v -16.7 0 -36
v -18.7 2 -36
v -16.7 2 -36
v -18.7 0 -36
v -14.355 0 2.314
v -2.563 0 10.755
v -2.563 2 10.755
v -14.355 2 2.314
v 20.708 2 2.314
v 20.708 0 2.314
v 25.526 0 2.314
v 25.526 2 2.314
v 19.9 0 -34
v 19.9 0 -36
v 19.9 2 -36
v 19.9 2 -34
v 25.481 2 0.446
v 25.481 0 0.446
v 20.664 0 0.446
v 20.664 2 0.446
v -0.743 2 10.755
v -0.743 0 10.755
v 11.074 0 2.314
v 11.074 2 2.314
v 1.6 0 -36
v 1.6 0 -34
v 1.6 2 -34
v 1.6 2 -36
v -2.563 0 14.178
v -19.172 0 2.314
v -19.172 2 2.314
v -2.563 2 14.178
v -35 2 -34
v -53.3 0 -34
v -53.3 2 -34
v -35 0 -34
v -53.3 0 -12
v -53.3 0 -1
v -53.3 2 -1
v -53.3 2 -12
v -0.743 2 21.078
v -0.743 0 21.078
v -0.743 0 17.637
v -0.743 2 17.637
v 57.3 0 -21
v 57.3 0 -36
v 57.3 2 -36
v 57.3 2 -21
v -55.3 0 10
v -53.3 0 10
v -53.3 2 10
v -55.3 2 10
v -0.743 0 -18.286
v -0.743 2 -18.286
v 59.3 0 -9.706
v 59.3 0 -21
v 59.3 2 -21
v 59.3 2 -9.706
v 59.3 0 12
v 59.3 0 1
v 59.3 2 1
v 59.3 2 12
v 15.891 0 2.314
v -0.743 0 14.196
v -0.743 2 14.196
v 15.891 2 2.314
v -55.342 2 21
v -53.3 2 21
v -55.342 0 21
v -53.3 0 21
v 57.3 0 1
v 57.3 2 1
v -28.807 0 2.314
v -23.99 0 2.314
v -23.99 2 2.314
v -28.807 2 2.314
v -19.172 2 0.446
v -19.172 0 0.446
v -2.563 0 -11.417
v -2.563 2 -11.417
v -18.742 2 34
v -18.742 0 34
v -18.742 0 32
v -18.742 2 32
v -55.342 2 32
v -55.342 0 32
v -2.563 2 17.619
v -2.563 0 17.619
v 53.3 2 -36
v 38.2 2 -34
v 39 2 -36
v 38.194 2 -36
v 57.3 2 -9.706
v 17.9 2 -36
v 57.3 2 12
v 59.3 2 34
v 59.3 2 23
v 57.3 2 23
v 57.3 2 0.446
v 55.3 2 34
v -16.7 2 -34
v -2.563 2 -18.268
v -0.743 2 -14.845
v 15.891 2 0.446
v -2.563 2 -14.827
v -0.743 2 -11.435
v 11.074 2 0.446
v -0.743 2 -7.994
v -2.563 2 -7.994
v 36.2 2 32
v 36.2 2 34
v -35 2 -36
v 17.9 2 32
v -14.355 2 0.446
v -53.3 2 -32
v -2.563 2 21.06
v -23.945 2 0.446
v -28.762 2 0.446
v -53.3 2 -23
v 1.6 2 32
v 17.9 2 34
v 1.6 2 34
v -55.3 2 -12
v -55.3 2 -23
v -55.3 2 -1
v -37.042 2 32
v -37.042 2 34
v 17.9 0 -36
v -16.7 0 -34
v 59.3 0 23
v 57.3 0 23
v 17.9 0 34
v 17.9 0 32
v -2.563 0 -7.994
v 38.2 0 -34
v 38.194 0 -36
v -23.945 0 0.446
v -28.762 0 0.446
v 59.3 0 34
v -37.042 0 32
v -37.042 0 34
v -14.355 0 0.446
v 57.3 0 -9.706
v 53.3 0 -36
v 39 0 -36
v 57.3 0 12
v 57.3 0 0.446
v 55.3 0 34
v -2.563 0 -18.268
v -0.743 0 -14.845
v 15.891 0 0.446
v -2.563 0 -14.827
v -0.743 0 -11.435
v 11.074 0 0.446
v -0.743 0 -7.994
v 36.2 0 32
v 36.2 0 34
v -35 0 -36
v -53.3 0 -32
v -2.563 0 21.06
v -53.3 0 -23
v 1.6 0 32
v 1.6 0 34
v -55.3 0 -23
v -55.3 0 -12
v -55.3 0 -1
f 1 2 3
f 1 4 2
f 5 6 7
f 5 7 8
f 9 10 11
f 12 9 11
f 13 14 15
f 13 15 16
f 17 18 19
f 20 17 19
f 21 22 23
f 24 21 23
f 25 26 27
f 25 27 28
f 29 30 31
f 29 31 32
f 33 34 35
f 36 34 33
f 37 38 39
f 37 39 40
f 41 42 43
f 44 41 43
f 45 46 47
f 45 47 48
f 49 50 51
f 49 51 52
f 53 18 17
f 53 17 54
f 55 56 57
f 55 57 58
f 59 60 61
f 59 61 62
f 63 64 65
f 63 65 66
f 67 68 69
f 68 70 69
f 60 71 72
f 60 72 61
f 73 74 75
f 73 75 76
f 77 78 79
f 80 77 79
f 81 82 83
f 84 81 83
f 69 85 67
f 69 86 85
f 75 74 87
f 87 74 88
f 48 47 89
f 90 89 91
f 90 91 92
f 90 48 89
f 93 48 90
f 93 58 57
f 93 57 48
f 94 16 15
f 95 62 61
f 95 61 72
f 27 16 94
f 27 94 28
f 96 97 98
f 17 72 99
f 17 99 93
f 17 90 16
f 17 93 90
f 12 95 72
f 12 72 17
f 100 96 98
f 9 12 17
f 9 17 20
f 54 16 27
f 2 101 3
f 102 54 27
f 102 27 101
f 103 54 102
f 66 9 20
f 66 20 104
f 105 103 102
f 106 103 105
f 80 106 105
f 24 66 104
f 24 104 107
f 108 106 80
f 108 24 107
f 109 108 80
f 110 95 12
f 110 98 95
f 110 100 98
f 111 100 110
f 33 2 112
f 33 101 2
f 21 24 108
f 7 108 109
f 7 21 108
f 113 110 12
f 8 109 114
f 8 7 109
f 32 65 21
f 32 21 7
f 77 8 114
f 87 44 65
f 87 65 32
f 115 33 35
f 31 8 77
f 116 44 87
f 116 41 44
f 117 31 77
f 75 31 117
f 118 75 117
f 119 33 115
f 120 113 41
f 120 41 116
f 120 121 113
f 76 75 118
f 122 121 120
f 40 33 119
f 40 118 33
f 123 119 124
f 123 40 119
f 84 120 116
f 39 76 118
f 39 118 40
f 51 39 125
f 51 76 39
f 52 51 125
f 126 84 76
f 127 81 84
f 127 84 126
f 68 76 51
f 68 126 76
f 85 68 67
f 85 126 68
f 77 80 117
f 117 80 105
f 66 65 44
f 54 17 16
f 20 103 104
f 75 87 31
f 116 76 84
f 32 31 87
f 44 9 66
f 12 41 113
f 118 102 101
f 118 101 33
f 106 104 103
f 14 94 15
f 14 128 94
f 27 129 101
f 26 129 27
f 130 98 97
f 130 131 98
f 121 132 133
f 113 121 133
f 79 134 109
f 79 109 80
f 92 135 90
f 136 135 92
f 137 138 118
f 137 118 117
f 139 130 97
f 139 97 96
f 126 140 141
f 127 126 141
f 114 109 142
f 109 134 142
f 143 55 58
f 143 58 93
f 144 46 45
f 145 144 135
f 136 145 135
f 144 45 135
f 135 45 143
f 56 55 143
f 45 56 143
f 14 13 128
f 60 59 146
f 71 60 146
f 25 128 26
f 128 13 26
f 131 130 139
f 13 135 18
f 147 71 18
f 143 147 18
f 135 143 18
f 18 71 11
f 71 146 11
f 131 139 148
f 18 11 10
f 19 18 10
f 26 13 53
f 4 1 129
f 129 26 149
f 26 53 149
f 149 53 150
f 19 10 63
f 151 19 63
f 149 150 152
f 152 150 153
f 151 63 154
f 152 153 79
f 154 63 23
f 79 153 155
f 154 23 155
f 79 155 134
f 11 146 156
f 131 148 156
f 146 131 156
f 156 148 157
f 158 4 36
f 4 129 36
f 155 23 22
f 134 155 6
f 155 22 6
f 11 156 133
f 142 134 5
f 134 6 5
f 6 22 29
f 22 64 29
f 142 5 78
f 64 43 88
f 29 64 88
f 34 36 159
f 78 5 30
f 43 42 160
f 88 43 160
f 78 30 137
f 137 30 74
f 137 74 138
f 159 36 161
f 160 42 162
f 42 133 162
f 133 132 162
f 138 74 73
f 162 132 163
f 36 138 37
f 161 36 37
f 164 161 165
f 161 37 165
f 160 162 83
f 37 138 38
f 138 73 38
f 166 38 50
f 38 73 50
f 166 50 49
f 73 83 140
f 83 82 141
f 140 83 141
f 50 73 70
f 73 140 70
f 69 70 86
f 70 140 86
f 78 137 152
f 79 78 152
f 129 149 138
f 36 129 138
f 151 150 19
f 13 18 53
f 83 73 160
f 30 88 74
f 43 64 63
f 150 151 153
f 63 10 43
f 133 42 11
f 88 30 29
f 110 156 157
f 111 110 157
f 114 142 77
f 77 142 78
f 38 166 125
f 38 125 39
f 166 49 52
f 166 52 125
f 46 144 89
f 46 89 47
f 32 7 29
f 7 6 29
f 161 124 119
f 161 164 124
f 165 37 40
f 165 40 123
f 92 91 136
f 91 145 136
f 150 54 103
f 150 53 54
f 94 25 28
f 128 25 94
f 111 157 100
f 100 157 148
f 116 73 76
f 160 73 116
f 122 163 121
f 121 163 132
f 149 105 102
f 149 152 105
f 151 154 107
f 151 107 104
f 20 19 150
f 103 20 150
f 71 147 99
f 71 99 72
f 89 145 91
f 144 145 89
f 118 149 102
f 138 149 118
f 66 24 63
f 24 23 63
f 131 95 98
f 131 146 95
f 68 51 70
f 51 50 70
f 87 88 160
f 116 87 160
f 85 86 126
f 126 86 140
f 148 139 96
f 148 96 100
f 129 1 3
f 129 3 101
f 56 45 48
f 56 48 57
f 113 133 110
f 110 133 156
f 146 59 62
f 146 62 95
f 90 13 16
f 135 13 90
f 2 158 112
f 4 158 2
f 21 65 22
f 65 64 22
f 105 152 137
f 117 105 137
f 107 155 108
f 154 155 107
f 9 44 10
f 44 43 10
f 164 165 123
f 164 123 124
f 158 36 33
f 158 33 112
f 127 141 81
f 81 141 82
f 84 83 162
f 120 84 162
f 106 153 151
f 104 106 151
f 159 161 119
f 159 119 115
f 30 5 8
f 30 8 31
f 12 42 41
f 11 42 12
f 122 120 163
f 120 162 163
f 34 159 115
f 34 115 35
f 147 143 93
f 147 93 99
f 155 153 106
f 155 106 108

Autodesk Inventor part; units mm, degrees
ref_plane "YZ Plane" through (0, 0, 0) normal (1, 0, 0) x (0, 1, 0)
ref_plane "XZ Plane" through (0, 0, 0) normal (0, 1, 0) x (-1, 0, 0)
ref_plane "XY Plane" through (0, 0, 0) normal (0, 0, 1) x (1, 0, 0)
sketch "Sketch1" plane through (0, 0, 0) normal (0, 1, 0) x (-1, 0, 0)
  line L0 (-55.3, 34) -> (55.3, -34) construction
  line L1 (55.3424, 32) -> (55.3424, 21)
  line L2 (53.3, 10) -> (55.3, 10)
  line L3 (55.3, 10) -> (55.3, -1)
  line L4 (55.3, -1) -> (53.3, -1)
  line L5 (53.3, -1) -> (53.3, -12)
  line L6 (53.3, -12) -> (55.3, -12)
  line L7 (55.3, -12) -> (55.3, -23)
  line L8 (55.3, -23) -> (53.3, -23)
  line L9 (55.3424, 21) -> (55.3424, 32)
  line L10 (55.3, -23) -> (55.3, -12)
  line L11 (55.3, -1) -> (55.3, 10)
  line L12 (-53.3, 0.4465) -> (-53.3, 0.446)
  line L13 (-53.3487, -21) -> (-53.3, -21)
  line L14 (55.3424, 32) -> (37.0424, 32)
  line L15 (37.0424, 32) -> (37.0424, 34)
  line L16 (37.0424, 34) -> (18.7424, 34)
  line L17 (18.7424, 34) -> (18.7424, 32)
  line L18 (18.7424, 32) -> (-1.6, 32)
  line L19 (-1.6, 32) -> (-1.6, 34)
  line L20 (-1.6, 34) -> (-17.9, 34)
  line L21 (-17.9, 34) -> (-17.9, 32)
  line L22 (-17.9, 32) -> (-36.2, 32)
  line L23 (-36.2, 32) -> (-36.2, 34)
  line L24 (37.0424, 34) -> (18.7424, 34)
  line L25 (-1.6, 34) -> (-17.9, 34)
  line L26 (-36.2, 34) -> (-55.3, 34)
  line L27 (2.5632, 10.7554) -> (14.3549, 2.3144)
  line L28 (0.7434, 10.7554) -> (-11.0739, 2.3144)
  line L29 (19.1722, 2.3144) -> (2.5632, 14.178)
  line L30 (0.7434, 14.1963) -> (-15.8912, 2.3144)
  line L31 (-20.6639, 0.446) -> (0.7434, -14.8449)
  line L32 (2.5632, -14.8267) -> (23.9449, 0.446)
  line L33 (23.9895, 2.3144) -> (2.5632, 17.6189)
  line L34 (0.7434, 17.6372) -> (-20.7085, 2.3144)
  line L35 (-25.4812, 0.446) -> (0.7434, -18.2859)
  line L36 (2.5632, -18.2676) -> (28.7623, 0.446)
  line L37 (28.8068, 2.3144) -> (2.5632, 21.0599)
  line L38 (41.2856, 32.5499) -> (41.2856, 32.5817)
  line L39 (54.8971, 24.1408) -> (54.9227, 24.1408)
  line L40 (14.3549, 0.446) -> (14.3549, 0.4779)
  line L41 (0.7434, 21.0782) -> (-25.5258, 2.3144)
  line L42 (-11.0739, 2.3144) -> (-15.8912, 2.3144)
  line L43 (-20.7085, 2.3144) -> (-25.5258, 2.3144)
  line L44 (0.7434, 21.0782) -> (0.7434, 17.6372)
  line L45 (0.7434, 14.1963) -> (0.7434, 10.7554)
  line L46 (2.5632, 10.7554) -> (2.5632, 14.178)
  line L47 (2.5632, 17.6189) -> (2.5632, 21.0599)
  line L48 (14.3549, 2.3144) -> (19.1722, 2.3144)
  line L49 (23.9895, 2.3144) -> (28.8068, 2.3144)
  line L50 (28.7623, 0.446) -> (23.9449, 0.446)
  line L51 (2.5632, -14.8267) -> (2.5632, -18.2676)
  line L52 (0.7434, -18.2859) -> (0.7434, -14.8449)
  line L53 (-25.4812, 0.446) -> (-20.6639, 0.446)
  line L54 (-11.0739, 0.4464) -> (-15.8912, 0.4464)
  line L55 (0.7434, -7.9945) -> (-11.0739, 0.4464)
  line L56 (0.7434, -11.4354) -> (-15.8912, 0.4464)
  line L57 (0.7434, -11.4354) -> (0.7434, -7.9945)
  line L58 (-11.7935, 1.3804) -> (-5.9618, 1.3804)
  line L59 (2.5632, 10.7554) -> (2.5632, 10.7554)
  line L60 (2.5632, -7.9945) -> (2.5632, -11.4171)
  line L61 (14.3549, 0.4464) -> (19.1722, 0.4464)
  line L62 (19.1722, 0.4464) -> (2.5632, -11.4171)
  line L63 (2.5632, -7.9945) -> (14.3549, 0.4464)
  line L64 (19.1722, 0.4464) -> (14.3549, 0.4464)
  line L65 (14.3549, 0.4464) -> (2.5632, -7.9945)
  line L66 (2.5632, -7.9945) -> (2.5632, -11.4171)
  line L67 (2.5632, -11.4171) -> (19.1722, 0.4464)
  line L68 (53.3, 10) -> (53.3, 21)
  line L69 (53.3, 21) -> (55.3424, 21)
  line L70 (53.3, -34.0004) -> (53.3, -34.0004)
  line L71 (53.3, -23) -> (53.3, -32)
  line L72 (34.2, -32.0004) -> (34.2, -32)
  line L73 (55.3, 34) -> (-52.0471, -32) construction
  line L74 (53.3, -32) -> (53.3, -34.0004)
  line L75 (-39, -36.0004) -> (-53.3, -36.0004)
  line L76 (-53.3, -36.0004) -> (-57.3, -36.0004)
  line L77 (-57.3, -36.0004) -> (-57.3, -21.0004)
  line L78 (-57.3, -21.0004) -> (-59.3, -21.0004)
  line L79 (-59.3, -21.0004) -> (-59.3, -9.7058)
  line L80 (-59.3, -9.7058) -> (-57.3, -9.7058)
  line L81 (-57.3, -9.7058) -> (-57.3, 0.4464)
  line L82 (-57.3, 0.4464) -> (-57.3, 1)
  line L83 (-57.3, 1) -> (-59.3, 1)
  line L84 (-59.3, 1) -> (-59.3, 12)
  line L85 (-59.3, 12) -> (-57.3, 12)
  line L86 (-57.3, 12) -> (-57.3, 23)
  line L87 (-57.3, 23) -> (-59.3, 23)
  line L88 (-59.3, 23) -> (-59.3, 34)
  line L89 (-59.3, 34) -> (-55.3, 34)
  line L90 (-53.3, -21) -> (-53.3, -21.0004)
  line L91 (-55.3, 32.0365) -> (-55.3, 32)
  line L92 (-55.3, 32.0365) -> (-55.3, 32)
  line L93 (-39, -36.0004) -> (-38.1942, -36.0004)
  line L94 (53.3, -34.0004) -> (35, -34.0004)
  line L95 (35, -34.0004) -> (35, -36.0004)
  line L96 (35, -36.0004) -> (18.7, -36.0004)
  line L97 (18.7, -36.0004) -> (16.7, -36.0004)
  line L98 (16.7, -36.0004) -> (16.7, -34.0004)
  line L99 (16.7, -34.0004) -> (-1.6, -34.0004)
  line L100 (-1.6, -34.0004) -> (-1.6, -36.0004)
  line L101 (-1.6, -36.0004) -> (-17.9, -36.0004)
  line L102 (-17.9, -36.0004) -> (-19.9, -36.0004)
  line L103 (-19.9, -36.0004) -> (-19.9, -34.0004)
  line L104 (-19.9, -34.0004) -> (-38.2, -34.0004)
  line L105 (-38.2, -34.0004) -> (-38.1942, -36.0004)
  point P0 (0, 0)
  point P1 (-53.3, 20.3166)
  point P2 (-53.3, 1)
  point P3 (-53.3, -10)
  point P4 (-55.3, -18.9529)
  point P5 (-53.3, -32.7703)
  point P6 (-16.7, -32.027)
  point P7 (-21.4801, -32.0004)
  point P8 (-17.9, -36.0004)
  dimension "d30" = 1.868
  dimension "d31" = 0.934
  dimension "d34" = 11
  dimension "d35" = 11
  dimension "d36" = 11
  dimension "d37" = 11
  dimension "d38" = 11
  dimension "d61" = 4
  dimension "d70" = 18.3
  dimension "d72" = 2
  dimension "d73" = 18.3
  dimension "d75" = 2
extrude "Extrusion1" add sketch "Sketch1" along normal blind 2
properties part number "ATAS"
